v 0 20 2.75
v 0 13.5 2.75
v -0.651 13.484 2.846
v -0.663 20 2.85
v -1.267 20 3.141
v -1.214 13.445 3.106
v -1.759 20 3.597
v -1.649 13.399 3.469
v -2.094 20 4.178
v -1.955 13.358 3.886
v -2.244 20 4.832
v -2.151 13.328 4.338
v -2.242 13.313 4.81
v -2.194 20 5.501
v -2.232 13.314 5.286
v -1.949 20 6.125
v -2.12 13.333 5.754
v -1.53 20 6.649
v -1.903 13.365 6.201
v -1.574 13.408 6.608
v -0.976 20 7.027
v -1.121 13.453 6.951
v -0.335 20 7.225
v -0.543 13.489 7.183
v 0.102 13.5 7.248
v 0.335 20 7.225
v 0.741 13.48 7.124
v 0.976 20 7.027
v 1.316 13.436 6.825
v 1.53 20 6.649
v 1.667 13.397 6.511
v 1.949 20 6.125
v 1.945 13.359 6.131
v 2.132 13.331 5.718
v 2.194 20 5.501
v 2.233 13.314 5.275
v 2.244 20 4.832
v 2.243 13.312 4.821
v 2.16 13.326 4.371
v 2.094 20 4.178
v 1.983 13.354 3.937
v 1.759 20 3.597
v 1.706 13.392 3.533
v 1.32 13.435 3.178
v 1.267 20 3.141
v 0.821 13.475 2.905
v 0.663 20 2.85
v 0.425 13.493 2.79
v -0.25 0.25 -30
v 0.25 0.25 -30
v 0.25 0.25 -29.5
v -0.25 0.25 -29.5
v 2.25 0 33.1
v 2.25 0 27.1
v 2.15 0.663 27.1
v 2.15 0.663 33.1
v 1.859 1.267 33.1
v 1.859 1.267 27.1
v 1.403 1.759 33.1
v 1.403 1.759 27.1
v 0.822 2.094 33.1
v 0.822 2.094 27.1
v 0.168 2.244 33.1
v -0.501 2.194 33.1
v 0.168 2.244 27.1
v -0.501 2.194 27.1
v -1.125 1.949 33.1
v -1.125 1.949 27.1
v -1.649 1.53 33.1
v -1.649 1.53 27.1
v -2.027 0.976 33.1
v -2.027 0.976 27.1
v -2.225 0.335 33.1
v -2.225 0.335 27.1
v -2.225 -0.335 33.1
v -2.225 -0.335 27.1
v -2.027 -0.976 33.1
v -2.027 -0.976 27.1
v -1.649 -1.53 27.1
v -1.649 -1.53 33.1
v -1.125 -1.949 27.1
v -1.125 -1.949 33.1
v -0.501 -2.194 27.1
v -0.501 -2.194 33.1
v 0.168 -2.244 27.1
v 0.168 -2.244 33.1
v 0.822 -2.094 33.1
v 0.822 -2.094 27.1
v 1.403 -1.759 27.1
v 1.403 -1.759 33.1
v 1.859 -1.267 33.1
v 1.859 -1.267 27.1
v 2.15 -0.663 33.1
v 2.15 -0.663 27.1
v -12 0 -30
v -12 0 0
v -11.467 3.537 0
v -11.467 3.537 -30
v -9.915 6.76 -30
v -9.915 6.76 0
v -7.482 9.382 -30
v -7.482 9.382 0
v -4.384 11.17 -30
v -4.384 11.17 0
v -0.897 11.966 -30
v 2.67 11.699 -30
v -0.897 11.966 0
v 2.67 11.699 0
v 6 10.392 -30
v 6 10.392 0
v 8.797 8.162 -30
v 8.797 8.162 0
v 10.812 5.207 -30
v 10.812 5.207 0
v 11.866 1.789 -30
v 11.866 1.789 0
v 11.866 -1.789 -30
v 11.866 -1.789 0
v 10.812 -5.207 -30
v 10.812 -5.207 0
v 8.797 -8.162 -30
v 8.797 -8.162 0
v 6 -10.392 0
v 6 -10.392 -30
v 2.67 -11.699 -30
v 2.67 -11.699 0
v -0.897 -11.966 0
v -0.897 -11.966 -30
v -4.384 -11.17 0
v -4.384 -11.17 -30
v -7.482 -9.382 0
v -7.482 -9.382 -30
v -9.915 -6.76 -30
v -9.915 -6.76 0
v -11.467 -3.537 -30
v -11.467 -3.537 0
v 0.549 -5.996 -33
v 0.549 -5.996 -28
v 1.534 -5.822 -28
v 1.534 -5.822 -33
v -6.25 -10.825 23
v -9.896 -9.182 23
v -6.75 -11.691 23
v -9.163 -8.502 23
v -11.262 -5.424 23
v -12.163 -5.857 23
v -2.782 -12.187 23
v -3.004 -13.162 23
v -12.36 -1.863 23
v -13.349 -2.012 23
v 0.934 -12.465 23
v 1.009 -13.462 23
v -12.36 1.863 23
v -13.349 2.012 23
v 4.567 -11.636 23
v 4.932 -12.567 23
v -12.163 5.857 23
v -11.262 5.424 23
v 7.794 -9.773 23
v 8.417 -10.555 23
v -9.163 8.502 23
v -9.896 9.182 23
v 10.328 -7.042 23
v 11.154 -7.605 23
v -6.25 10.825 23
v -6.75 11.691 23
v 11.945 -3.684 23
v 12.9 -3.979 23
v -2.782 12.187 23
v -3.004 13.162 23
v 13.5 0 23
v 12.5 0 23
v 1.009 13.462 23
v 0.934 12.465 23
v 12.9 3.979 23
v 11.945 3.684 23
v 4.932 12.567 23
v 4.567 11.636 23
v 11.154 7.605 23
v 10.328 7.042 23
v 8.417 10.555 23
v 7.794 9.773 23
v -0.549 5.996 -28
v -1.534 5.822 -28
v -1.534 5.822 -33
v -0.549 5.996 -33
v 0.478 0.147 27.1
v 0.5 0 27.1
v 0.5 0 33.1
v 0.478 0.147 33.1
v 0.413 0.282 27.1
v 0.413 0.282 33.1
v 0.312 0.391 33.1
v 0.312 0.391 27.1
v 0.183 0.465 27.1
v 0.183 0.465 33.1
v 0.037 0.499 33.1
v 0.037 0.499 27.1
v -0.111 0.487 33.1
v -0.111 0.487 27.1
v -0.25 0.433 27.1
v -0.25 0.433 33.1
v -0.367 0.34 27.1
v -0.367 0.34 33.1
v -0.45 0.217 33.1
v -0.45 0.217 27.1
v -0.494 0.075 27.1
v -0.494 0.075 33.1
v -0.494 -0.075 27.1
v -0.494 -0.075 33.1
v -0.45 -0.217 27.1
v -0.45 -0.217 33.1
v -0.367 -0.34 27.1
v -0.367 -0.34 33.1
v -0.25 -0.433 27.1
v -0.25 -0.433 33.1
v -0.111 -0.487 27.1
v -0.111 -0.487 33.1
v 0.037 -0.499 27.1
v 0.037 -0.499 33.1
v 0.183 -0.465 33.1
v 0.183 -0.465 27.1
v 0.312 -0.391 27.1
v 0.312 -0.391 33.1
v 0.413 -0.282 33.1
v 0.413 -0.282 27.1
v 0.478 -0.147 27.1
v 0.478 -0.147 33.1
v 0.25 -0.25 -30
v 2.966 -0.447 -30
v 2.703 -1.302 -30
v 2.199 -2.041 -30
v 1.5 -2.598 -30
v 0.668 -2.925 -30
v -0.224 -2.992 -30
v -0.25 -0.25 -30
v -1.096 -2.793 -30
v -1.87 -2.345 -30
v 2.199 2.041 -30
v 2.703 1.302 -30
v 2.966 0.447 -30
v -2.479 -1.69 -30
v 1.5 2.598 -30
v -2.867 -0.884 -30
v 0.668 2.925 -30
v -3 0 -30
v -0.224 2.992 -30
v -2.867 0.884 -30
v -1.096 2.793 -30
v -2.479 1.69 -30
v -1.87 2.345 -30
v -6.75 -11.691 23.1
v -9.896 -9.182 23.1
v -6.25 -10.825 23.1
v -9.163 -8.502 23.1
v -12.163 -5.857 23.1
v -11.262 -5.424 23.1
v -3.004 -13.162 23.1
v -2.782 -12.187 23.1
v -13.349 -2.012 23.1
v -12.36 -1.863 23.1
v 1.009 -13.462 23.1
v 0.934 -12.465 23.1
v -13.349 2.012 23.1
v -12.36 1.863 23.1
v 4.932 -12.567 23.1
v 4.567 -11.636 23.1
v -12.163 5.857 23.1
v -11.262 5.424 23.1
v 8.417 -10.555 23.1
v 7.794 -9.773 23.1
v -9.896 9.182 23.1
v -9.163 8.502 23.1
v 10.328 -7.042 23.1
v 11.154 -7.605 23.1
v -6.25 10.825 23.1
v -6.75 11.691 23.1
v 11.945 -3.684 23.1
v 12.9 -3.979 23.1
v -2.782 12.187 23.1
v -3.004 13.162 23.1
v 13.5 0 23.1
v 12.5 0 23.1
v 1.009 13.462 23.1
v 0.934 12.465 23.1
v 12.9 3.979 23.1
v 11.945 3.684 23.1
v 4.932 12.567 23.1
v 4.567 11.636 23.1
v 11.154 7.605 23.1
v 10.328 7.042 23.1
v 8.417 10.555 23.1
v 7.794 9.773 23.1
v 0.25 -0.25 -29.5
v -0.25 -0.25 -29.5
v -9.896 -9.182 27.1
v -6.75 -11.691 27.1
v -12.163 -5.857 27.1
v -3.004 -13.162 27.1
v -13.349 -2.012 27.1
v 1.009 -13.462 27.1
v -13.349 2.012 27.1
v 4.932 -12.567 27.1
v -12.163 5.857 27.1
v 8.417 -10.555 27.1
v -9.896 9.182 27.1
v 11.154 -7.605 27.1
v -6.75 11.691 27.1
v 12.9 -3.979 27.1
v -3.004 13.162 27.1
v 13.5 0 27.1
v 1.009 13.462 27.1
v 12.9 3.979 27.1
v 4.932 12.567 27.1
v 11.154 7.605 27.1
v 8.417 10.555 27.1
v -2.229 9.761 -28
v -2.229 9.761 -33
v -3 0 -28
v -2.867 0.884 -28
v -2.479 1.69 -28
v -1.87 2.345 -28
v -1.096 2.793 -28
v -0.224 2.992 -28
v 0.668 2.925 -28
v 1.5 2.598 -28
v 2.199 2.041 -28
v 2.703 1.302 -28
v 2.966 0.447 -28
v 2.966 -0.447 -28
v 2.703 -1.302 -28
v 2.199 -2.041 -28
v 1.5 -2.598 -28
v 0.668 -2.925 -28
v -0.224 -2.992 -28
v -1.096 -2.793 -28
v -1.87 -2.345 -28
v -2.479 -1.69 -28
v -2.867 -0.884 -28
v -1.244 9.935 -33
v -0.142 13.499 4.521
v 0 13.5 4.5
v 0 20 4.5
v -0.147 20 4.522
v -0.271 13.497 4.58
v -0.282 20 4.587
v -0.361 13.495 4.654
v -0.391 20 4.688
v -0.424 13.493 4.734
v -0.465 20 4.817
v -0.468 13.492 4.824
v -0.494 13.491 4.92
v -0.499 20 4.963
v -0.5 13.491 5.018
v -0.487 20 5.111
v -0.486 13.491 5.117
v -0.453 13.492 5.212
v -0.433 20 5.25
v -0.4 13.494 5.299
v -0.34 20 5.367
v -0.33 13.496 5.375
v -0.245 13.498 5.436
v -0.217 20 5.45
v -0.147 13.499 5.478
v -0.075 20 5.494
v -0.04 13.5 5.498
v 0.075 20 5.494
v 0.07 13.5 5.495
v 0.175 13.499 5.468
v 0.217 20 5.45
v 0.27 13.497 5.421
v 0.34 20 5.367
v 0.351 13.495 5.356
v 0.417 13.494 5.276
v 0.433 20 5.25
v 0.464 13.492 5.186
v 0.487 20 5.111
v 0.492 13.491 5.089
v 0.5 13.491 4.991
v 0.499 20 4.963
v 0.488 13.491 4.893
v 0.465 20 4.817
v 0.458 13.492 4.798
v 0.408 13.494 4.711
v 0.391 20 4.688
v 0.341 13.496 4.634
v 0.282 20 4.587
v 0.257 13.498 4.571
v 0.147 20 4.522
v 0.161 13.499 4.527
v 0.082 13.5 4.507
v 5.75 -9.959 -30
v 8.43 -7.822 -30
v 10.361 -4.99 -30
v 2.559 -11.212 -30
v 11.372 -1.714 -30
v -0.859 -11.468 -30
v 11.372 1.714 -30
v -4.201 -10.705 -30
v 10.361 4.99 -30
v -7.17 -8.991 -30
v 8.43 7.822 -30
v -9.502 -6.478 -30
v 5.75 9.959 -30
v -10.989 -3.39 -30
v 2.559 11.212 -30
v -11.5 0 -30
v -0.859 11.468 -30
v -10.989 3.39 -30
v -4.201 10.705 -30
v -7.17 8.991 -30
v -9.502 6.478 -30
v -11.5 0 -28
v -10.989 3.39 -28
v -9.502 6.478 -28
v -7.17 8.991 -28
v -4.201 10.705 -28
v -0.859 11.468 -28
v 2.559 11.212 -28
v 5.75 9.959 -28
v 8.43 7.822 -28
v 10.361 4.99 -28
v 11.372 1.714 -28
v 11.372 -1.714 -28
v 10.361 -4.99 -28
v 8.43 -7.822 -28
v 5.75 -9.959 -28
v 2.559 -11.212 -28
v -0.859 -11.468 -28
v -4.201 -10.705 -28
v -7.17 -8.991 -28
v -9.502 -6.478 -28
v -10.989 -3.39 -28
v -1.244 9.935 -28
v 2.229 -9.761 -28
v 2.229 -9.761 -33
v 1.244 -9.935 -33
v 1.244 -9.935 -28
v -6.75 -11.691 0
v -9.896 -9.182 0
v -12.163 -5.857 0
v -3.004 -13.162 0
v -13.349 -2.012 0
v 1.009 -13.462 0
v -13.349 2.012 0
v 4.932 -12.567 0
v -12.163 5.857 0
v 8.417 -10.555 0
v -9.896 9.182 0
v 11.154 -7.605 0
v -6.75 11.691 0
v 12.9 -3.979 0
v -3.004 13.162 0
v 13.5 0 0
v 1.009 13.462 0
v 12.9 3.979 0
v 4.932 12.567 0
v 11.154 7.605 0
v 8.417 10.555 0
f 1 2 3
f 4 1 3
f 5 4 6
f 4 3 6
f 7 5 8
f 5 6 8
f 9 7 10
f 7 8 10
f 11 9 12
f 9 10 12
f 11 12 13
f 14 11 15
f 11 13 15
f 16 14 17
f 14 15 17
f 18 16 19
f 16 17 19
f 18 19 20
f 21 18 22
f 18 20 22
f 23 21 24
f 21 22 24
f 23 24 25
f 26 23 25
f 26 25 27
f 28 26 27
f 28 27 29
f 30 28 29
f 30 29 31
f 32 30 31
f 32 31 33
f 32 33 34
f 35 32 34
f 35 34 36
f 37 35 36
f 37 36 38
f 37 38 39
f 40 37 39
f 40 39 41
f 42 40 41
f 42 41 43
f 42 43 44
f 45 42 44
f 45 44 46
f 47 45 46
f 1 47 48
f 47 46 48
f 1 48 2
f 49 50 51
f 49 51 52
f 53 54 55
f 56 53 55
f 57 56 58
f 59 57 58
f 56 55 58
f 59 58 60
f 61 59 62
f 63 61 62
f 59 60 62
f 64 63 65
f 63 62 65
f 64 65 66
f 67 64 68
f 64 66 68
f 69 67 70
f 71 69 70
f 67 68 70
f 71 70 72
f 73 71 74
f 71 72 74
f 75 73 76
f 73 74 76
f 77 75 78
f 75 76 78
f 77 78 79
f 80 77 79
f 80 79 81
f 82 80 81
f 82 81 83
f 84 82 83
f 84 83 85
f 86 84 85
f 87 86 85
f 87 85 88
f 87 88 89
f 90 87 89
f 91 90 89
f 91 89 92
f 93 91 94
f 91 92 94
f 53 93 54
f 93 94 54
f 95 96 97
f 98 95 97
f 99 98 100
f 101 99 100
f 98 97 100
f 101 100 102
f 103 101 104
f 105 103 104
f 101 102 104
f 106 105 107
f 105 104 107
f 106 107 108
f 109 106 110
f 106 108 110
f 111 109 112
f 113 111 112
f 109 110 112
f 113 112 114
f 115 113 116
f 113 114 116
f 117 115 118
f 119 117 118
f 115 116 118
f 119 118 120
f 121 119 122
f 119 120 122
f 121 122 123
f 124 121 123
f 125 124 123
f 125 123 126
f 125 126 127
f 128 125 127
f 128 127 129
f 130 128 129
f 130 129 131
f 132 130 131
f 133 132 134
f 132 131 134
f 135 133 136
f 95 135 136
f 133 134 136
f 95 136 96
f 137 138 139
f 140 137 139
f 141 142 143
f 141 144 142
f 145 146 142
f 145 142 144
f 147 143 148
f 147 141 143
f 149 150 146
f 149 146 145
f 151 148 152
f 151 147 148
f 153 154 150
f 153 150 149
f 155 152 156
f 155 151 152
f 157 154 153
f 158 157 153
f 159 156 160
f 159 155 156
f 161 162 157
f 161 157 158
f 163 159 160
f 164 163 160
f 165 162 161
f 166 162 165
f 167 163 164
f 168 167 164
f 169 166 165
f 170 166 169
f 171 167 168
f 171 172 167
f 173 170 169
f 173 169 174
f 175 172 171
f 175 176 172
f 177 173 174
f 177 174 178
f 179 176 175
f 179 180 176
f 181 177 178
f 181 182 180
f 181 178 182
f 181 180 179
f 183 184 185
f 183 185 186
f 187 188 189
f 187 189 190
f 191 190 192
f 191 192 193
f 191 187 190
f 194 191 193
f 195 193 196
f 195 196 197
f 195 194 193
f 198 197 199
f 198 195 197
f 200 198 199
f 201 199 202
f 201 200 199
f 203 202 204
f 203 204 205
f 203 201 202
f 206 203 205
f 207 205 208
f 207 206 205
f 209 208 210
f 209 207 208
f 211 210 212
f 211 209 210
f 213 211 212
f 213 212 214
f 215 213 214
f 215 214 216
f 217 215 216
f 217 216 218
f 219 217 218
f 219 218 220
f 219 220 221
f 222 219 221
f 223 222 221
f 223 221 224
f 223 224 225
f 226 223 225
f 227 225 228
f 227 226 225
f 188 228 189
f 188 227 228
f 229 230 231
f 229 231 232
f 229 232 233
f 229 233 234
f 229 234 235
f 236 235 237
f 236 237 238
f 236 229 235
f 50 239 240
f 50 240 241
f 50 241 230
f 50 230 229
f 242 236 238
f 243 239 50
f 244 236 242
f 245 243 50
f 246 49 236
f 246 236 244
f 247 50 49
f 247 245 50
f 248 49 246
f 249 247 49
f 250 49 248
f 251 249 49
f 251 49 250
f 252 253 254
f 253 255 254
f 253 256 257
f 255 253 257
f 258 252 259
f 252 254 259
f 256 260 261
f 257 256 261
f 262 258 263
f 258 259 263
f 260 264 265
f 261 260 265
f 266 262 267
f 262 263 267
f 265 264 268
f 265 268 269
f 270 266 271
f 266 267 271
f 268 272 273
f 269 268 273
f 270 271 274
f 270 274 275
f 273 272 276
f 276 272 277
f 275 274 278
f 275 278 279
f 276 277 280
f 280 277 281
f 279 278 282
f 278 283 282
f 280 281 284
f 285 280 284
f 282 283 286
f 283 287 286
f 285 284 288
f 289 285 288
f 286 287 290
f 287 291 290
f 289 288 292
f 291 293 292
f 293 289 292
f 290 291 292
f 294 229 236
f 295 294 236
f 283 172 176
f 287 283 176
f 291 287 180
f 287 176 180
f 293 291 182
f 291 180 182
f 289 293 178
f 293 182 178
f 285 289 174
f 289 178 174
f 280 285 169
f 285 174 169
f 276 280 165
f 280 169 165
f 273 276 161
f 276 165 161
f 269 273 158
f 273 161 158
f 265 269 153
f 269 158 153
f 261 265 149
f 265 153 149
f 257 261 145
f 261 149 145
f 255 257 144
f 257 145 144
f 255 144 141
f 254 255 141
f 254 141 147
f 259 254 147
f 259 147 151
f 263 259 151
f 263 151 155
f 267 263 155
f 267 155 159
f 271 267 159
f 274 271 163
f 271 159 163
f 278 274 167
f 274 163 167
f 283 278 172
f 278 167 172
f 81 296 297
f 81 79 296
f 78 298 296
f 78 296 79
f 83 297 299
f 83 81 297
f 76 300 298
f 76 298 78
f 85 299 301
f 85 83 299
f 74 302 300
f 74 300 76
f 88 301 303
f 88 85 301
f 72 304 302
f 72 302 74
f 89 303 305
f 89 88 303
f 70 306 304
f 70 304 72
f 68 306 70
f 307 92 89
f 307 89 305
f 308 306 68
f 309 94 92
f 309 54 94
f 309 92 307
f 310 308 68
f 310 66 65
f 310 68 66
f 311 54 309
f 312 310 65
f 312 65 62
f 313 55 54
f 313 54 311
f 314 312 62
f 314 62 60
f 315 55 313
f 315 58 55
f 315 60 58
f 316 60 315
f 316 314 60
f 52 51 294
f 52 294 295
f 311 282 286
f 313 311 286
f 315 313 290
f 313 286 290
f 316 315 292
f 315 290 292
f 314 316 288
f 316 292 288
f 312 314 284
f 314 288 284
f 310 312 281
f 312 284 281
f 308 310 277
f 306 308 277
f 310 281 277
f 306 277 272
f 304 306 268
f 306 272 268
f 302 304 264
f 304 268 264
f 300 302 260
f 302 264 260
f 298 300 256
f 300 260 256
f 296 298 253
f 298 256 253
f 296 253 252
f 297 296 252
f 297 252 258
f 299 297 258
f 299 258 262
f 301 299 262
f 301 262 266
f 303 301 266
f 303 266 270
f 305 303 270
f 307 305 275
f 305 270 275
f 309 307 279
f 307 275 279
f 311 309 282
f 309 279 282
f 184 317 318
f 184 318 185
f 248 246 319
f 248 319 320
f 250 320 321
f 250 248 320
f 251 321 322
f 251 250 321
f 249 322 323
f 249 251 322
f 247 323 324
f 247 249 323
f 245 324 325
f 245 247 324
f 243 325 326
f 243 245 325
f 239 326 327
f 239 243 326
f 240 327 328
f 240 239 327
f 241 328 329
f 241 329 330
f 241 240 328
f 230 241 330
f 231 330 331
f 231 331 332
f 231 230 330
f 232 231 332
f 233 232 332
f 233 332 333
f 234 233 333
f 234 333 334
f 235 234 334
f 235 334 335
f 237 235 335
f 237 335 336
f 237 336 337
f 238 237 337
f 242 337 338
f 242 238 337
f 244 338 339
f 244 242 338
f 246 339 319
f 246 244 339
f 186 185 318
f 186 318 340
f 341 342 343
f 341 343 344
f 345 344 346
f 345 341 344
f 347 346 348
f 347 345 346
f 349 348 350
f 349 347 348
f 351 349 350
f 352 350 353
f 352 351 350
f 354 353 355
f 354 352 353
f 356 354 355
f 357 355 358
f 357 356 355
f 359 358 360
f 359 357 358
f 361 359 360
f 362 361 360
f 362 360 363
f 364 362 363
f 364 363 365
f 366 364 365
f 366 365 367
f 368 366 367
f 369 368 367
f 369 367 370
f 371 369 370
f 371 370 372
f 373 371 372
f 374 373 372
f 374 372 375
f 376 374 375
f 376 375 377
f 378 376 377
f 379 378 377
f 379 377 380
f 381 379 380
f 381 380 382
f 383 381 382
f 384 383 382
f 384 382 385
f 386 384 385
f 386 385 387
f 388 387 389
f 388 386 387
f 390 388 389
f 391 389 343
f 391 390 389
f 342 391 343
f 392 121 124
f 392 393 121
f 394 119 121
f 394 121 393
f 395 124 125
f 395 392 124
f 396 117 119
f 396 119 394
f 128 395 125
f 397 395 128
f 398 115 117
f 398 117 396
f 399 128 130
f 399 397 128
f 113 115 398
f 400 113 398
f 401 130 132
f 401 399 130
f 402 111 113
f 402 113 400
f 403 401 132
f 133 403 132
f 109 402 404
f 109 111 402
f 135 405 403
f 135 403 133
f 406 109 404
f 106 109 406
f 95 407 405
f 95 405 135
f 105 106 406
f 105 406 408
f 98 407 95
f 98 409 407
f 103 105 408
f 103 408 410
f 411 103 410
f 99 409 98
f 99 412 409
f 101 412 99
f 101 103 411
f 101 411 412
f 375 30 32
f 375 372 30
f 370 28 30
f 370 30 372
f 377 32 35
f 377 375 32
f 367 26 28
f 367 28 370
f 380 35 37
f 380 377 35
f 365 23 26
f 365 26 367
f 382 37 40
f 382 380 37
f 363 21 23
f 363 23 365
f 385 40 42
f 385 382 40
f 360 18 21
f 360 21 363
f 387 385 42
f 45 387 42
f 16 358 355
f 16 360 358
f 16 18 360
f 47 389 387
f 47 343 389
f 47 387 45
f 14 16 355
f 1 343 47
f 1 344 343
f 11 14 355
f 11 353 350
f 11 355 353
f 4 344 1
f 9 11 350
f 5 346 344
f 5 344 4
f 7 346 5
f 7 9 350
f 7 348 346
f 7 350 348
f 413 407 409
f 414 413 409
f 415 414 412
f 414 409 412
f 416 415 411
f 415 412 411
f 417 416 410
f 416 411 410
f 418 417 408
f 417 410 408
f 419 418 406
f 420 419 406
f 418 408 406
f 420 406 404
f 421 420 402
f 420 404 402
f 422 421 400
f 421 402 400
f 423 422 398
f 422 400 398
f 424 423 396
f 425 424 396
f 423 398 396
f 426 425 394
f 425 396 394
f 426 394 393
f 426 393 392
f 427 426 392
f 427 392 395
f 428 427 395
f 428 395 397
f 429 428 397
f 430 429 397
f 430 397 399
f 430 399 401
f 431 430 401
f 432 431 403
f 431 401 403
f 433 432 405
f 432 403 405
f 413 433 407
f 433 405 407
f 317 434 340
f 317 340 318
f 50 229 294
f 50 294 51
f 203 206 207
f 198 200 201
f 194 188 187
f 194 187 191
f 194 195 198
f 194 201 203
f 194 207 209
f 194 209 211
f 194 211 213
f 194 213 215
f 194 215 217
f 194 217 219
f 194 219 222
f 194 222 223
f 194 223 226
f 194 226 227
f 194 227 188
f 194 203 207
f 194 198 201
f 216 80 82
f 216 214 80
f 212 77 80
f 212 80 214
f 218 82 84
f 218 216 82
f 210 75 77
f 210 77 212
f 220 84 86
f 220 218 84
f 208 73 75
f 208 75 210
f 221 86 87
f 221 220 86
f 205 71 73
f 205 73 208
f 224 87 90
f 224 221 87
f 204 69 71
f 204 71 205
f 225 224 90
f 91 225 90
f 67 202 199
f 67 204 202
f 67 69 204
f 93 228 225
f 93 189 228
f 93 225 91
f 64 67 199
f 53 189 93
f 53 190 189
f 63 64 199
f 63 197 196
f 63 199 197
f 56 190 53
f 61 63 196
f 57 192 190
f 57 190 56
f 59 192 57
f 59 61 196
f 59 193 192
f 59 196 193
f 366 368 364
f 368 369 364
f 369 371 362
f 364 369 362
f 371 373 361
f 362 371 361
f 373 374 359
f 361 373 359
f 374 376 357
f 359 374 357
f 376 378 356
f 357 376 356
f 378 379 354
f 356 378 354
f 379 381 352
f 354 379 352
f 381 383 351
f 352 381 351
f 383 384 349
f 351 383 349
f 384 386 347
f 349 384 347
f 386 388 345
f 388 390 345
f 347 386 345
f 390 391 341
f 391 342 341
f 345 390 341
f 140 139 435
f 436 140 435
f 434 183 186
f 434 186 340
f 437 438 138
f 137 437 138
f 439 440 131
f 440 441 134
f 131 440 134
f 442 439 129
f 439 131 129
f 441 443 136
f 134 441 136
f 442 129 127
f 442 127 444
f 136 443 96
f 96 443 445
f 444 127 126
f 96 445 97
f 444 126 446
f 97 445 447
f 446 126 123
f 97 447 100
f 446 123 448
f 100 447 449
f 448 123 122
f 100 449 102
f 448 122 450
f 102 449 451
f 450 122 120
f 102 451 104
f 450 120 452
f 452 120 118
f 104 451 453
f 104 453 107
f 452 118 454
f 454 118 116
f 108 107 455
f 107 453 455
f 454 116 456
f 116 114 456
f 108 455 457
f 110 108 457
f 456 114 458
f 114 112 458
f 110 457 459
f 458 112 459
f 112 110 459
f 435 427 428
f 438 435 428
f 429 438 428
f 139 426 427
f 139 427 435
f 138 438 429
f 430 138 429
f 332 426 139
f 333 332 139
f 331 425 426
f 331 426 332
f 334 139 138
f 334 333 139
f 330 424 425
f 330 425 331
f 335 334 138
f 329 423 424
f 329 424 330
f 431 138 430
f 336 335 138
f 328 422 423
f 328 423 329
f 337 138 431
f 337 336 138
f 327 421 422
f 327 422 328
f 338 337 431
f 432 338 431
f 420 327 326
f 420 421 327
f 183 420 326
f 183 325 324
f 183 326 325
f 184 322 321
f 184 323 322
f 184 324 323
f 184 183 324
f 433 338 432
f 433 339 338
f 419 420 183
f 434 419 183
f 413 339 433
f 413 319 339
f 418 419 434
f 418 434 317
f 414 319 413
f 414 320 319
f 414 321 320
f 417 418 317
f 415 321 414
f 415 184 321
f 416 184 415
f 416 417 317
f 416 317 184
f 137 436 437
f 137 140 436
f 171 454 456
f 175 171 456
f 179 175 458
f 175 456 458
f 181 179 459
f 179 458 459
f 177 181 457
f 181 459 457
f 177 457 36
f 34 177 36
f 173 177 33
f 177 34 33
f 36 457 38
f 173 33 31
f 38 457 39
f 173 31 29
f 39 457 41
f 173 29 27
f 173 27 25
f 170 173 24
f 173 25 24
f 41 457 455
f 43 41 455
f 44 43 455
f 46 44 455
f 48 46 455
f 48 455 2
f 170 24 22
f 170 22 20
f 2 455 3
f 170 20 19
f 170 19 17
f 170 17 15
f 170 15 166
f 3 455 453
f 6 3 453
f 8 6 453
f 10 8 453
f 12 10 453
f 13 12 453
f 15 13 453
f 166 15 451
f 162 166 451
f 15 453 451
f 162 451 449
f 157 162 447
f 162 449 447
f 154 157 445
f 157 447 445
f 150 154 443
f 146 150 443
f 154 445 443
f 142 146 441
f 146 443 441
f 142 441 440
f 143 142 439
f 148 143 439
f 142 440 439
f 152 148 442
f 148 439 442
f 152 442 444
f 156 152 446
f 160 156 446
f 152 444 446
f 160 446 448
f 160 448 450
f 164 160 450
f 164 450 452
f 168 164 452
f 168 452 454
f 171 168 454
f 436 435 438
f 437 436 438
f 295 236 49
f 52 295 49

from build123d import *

# Parameters (mm, degrees)
SKETCH1_R           = 13.5
BOSS_EXTRUDE1_DEPTH = 23
SKETCH2_R           = 12.5
BOSS_EXTRUDE2_DEPTH = 0.1
SKETCH3_R           = 13.5
BOSS_EXTRUDE3_DEPTH = 4
SKETCH4_R           = 12
BOSS_EXTRUDE4_DEPTH = 30
SKETCH5_R           = 11.5
SKETCH5_R_2         = 3
CUT_EXTRUDE1_DEPTH  = 2
SKETCH6_R           = 2.25
SKETCH6_R_2         = 0.5
BOSS_EXTRUDE5_DEPTH = 6
SKETCH7_R           = 2.25
SKETCH7_R_2         = 0.5
BOSS_EXTRUDE6_DEPTH = 20
BOSS_EXTRUDE7_DEPTH = 5
SKETCH9_W           = 0.5
SKETCH9_H           = 0.5
CUT_EXTRUDE2_DEPTH  = 0.5


with BuildPart() as part:
    # Sketch1 → Boss-Extrude1 (new body)
    with BuildSketch(Plane.XY):
        Circle(SKETCH1_R)
    extrude(amount=BOSS_EXTRUDE1_DEPTH)

    # Sketch2 → Boss-Extrude2 (add)
    with BuildSketch(Plane.XY.offset(23)):
        Circle(SKETCH2_R)
    extrude(amount=BOSS_EXTRUDE2_DEPTH)

    # Sketch3 → Boss-Extrude3 (add)
    with BuildSketch(Plane.XY.offset(23.1)):
        Circle(SKETCH3_R)
    extrude(amount=BOSS_EXTRUDE3_DEPTH)

    # Sketch4 → Boss-Extrude4 (add)
    with BuildSketch(Plane(origin=(0, 0, 0), x_dir=(-1, 0, 0), z_dir=(0, 0, -1))):
        Circle(SKETCH4_R)
    extrude(amount=BOSS_EXTRUDE4_DEPTH)

    # Sketch5 → Cut-Extrude1 (cut)
    with BuildSketch(Plane(origin=(0, 0, -30), x_dir=(-1, 0, 0), z_dir=(0, 0, -1))):
        Circle(SKETCH5_R)
        Circle(SKETCH5_R_2, mode=Mode.SUBTRACT)
    extrude(amount=-CUT_EXTRUDE1_DEPTH, mode=Mode.SUBTRACT)

    # Sketch6 → Boss-Extrude5 (add)
    with BuildSketch(Plane.XY.offset(27.1)):
        Circle(SKETCH6_R)
        Circle(SKETCH6_R_2, mode=Mode.SUBTRACT)
    extrude(amount=BOSS_EXTRUDE5_DEPTH)

    # Sketch7 → Boss-Extrude6 (add)
    with BuildSketch(Plane(origin=(0, 0, 0), x_dir=(1, 0, 0), z_dir=(0, 1, 0))):
        with Locations((0, -5)):
            Circle(SKETCH7_R)
        with Locations((0, -5)):
            Circle(SKETCH7_R_2, mode=Mode.SUBTRACT)
    extrude(amount=BOSS_EXTRUDE6_DEPTH)

    # Sketch8 → Boss-Extrude7 (add)
    with BuildSketch(Plane(origin=(0, 0, -28), x_dir=(-1, 0, 0), z_dir=(0, 0, -1))):
        Polygon((0.549485189, 5.995670607), (1.2440779, 9.934901619), (2.228885653, 9.761253441), (1.534292943, 5.822022429), align=None)
        Polygon((-2.228885653, -9.761253441), (-1.2440779, -9.934901619), (-0.549485189, -5.995670607), (-1.534292943, -5.822022429), align=None)
    extrude(amount=BOSS_EXTRUDE7_DEPTH)

    # Sketch9 → Cut-Extrude2 (cut)
    with BuildSketch(Plane(origin=(0, 0, -30), x_dir=(-1, 0, 0), z_dir=(0, 0, -1))):
        Rectangle(SKETCH9_W, SKETCH9_H)
    extrude(amount=-CUT_EXTRUDE2_DEPTH, mode=Mode.SUBTRACT)


solid = part.part
